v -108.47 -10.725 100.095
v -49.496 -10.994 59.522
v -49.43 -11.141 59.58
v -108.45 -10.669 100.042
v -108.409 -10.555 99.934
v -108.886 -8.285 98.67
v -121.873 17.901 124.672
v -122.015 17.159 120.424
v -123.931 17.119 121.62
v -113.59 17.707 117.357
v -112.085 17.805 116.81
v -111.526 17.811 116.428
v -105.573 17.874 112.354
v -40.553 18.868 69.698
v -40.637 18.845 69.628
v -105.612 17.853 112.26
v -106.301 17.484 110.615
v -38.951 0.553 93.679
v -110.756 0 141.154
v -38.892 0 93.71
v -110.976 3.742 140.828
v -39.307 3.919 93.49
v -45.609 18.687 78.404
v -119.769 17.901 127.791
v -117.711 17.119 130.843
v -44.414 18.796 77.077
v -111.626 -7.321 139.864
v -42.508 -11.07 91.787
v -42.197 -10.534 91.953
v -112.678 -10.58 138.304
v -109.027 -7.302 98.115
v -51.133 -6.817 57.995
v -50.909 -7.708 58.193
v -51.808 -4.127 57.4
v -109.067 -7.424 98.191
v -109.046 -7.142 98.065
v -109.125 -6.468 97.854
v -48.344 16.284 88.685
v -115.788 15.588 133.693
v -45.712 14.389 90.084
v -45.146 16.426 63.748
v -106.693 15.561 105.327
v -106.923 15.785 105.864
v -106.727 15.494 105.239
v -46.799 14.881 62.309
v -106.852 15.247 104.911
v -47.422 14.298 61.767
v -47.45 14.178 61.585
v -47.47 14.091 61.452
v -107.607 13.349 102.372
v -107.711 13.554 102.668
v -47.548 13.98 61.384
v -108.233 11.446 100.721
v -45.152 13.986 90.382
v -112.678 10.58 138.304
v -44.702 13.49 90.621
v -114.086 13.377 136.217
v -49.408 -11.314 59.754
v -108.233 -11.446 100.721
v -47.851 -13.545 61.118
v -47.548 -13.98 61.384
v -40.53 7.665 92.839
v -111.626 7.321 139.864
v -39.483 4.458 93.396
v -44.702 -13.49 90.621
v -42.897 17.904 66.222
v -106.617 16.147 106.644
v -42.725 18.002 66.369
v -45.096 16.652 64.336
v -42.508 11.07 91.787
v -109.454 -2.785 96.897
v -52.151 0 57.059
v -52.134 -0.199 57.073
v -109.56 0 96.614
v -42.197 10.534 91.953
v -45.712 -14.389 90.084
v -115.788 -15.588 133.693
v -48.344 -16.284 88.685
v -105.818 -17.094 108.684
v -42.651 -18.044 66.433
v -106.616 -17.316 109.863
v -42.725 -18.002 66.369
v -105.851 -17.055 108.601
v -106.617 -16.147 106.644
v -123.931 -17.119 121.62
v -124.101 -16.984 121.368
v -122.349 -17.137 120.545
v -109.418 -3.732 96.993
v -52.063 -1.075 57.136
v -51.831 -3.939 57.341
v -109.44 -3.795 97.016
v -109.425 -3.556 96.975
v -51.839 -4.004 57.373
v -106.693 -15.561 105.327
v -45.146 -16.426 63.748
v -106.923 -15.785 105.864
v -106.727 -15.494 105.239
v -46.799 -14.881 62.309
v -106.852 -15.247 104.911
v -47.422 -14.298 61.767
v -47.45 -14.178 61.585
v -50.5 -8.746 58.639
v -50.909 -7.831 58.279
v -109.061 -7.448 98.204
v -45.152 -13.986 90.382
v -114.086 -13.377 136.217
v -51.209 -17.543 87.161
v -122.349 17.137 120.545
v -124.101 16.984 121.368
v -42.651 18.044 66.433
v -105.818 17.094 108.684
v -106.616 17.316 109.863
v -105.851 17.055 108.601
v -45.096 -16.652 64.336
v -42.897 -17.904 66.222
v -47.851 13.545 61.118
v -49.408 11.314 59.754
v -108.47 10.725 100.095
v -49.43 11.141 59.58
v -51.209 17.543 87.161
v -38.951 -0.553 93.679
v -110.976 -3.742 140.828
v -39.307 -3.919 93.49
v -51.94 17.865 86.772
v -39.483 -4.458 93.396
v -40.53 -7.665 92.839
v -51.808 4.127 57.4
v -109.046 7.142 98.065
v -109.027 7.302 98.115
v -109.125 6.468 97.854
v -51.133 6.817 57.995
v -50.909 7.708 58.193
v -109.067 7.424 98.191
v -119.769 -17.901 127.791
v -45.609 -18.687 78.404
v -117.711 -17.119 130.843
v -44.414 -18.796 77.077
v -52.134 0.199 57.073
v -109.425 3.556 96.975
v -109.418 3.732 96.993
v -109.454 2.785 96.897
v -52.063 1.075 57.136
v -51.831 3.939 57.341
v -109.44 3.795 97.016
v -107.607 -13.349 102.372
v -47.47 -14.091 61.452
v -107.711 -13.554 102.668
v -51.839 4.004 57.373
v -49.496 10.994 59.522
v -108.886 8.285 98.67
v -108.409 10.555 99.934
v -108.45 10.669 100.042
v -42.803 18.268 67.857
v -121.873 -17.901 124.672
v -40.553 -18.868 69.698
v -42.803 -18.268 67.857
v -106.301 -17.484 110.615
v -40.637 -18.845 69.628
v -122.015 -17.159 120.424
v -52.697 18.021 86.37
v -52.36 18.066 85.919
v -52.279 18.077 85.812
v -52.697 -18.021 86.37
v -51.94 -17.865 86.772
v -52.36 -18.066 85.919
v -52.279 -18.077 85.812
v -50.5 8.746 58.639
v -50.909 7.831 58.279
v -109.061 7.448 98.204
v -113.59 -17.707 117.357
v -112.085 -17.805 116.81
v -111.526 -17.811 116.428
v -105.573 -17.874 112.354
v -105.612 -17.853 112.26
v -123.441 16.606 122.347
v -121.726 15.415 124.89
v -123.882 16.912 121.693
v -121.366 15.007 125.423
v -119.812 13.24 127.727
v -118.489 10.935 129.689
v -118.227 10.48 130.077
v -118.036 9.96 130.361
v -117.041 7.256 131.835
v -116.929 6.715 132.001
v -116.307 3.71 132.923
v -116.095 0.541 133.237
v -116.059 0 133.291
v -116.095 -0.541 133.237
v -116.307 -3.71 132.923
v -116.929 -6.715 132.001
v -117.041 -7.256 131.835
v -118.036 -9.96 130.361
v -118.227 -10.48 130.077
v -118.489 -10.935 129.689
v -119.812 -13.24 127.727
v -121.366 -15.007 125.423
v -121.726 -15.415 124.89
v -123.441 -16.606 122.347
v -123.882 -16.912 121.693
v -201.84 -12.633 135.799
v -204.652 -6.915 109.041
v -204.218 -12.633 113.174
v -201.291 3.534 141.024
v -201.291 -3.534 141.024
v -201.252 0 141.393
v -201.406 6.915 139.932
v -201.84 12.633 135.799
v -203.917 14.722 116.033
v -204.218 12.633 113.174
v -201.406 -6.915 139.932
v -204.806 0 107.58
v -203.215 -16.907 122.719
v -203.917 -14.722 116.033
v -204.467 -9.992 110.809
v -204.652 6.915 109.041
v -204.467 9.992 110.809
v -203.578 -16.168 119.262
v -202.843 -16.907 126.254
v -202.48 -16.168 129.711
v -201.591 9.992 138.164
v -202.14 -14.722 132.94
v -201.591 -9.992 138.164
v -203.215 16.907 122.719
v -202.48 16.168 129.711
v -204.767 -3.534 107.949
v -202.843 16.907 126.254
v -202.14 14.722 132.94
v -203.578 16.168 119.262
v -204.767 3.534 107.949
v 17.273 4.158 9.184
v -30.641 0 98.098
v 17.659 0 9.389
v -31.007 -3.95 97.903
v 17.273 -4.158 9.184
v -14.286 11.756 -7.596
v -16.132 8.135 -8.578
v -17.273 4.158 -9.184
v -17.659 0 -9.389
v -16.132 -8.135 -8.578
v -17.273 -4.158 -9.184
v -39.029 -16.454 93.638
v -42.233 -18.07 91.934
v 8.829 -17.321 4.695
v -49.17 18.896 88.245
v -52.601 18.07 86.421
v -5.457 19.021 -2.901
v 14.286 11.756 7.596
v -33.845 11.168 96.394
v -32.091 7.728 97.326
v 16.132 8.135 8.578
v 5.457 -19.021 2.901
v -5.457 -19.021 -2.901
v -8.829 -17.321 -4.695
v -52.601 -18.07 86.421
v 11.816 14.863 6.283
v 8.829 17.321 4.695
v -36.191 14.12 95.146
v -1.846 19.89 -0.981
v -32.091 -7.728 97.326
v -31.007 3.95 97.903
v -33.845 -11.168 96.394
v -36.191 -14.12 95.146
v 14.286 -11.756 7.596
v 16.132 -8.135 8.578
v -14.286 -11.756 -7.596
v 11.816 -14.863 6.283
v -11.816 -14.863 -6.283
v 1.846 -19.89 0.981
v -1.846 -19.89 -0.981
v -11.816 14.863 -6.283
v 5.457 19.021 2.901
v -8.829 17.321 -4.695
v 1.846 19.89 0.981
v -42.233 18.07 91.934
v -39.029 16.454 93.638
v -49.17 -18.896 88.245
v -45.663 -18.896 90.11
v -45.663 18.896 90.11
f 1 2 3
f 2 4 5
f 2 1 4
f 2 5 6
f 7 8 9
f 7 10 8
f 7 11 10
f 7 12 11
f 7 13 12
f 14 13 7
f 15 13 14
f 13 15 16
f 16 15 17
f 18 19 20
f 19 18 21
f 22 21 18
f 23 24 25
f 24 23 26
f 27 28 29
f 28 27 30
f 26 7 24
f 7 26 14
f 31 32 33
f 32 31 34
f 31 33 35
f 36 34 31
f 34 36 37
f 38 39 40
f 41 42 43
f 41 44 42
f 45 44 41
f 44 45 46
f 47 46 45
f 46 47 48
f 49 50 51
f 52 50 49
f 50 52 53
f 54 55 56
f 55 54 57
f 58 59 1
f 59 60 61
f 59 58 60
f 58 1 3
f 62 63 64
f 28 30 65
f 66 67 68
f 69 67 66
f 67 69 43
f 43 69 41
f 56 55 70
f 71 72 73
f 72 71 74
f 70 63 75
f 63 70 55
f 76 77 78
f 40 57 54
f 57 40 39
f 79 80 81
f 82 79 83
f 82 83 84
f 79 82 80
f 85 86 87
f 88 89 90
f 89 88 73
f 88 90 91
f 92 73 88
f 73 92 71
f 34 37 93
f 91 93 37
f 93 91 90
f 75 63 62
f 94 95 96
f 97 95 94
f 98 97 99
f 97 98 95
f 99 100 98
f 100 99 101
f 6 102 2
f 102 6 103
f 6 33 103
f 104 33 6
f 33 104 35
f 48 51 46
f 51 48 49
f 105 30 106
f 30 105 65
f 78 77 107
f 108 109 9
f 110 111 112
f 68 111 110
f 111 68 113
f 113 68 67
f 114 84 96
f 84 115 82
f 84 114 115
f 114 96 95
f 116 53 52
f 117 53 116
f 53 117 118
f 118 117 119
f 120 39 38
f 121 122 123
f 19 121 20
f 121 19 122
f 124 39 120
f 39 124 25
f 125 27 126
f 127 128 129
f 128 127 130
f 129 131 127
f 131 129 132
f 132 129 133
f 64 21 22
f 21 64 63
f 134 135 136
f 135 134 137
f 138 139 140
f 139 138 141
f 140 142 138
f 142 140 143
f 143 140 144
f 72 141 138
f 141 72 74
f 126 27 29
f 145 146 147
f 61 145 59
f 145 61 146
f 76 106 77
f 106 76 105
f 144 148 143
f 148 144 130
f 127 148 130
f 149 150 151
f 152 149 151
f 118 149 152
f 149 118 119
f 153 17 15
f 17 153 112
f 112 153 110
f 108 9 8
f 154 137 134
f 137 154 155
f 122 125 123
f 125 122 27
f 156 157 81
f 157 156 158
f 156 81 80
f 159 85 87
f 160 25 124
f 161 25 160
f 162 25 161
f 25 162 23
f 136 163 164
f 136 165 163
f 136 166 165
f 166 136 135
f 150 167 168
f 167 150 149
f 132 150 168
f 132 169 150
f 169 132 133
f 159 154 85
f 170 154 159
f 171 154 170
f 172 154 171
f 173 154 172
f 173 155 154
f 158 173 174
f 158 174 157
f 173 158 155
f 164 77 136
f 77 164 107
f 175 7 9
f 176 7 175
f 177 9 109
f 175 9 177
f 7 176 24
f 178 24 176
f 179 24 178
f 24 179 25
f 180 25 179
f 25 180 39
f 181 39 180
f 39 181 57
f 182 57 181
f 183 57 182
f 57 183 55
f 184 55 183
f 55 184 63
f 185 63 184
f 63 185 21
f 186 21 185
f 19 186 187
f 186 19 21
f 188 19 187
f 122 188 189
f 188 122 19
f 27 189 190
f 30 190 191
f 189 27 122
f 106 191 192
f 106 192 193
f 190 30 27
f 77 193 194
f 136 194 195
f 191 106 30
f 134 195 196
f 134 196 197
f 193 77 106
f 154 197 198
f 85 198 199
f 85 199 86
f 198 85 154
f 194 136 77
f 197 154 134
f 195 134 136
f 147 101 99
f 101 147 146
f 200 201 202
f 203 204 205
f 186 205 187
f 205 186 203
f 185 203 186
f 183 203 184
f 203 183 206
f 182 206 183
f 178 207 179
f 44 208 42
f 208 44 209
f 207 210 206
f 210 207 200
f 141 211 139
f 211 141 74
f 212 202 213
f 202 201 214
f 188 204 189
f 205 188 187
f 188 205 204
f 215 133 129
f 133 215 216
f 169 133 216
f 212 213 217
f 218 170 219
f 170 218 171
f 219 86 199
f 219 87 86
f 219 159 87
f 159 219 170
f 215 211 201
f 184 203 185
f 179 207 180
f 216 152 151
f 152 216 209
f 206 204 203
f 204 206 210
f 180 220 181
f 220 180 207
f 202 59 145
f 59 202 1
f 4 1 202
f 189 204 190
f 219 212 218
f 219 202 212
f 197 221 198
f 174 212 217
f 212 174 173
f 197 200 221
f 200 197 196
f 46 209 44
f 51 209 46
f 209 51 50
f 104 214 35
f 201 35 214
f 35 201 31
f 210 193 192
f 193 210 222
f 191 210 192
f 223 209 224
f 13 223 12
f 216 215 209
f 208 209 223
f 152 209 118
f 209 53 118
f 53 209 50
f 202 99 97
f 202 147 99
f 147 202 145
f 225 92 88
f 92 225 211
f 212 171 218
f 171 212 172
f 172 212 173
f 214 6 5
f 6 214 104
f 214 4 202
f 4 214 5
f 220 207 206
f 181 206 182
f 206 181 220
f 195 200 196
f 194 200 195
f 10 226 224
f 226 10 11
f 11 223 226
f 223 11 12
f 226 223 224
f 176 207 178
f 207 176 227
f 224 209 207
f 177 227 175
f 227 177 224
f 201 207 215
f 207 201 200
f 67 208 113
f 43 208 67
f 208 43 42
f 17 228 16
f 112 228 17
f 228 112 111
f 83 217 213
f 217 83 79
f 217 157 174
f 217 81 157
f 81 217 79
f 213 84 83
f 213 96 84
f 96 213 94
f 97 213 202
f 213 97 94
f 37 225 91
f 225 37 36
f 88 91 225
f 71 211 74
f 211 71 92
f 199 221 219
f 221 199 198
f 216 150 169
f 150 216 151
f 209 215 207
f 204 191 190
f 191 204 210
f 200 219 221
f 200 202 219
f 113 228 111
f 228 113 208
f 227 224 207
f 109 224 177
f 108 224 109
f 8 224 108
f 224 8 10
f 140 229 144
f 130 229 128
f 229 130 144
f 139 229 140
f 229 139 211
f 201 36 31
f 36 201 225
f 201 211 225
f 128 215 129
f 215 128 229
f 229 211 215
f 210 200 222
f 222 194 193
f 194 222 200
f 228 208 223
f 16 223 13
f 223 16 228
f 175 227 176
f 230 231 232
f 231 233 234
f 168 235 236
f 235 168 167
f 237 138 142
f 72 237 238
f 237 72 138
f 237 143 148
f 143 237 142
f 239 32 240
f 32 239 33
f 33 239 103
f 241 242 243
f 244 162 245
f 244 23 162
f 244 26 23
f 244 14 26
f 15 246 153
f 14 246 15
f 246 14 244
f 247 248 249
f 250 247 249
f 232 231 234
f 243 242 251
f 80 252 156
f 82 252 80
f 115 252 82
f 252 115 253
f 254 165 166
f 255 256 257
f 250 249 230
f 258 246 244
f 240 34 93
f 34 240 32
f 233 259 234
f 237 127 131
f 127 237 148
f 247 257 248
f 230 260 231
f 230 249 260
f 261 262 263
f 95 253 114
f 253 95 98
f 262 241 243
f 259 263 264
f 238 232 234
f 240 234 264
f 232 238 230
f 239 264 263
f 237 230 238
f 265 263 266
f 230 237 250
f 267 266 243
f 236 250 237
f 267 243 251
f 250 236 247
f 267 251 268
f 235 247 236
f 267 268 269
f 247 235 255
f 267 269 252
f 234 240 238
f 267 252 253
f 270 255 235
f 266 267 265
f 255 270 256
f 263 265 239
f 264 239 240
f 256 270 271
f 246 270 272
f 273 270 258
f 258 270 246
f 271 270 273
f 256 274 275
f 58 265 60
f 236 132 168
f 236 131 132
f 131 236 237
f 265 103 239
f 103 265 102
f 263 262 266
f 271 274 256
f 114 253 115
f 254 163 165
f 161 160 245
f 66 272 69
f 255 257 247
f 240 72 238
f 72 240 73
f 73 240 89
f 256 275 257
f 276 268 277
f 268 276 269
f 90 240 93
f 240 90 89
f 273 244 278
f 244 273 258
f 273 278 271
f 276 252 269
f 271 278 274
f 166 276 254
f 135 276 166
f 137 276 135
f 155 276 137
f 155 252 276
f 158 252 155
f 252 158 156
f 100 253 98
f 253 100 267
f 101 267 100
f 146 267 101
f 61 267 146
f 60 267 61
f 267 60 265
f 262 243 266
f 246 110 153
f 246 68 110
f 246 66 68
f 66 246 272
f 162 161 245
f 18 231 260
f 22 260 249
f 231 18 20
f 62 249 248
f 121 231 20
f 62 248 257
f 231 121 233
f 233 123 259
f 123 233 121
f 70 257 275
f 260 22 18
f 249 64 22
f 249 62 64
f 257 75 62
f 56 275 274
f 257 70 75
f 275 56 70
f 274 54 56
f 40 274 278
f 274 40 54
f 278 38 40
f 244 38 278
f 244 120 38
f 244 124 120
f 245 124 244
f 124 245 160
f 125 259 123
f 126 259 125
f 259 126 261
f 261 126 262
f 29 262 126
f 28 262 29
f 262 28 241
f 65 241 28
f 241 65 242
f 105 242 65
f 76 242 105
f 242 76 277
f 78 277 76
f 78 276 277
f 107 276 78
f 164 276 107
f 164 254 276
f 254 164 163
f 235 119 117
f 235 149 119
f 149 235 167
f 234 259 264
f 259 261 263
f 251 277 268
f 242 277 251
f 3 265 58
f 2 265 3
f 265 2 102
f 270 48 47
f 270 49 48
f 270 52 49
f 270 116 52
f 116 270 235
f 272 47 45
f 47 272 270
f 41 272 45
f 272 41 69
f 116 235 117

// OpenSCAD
SEED = rands(0, 100, 1)[0];
START_SIZE = 20;
START_HEIGHT = 90;

module childBranch(maxDepth = 3, seed, depth = 0, child = 1) {
  angle = 4 * (seed == -1 ?
    floor(rands(-12, 12, 1)[0]) : 
    floor(rands(-12, 12, 1, seed + child + 1)[0])
  );
  
  height = SEED == -1 ?
    floor(rands(4, 12, 1)[0]) * 2 :
    floor(rands(8, 24, 1, seed + child + 2)[0]);

  slide = SEED == -1 ?
    floor(rands(18, 24, 1)[0]) :
    floor(rands(18, 24, 1, seed + 3)[0]);

  rotate([0, angle, 0]) {
    cylinder(START_HEIGHT + height, START_SIZE - depth, START_SIZE - depth - 1);
   
    if (depth < maxDepth) {
      translate([0, 0, START_HEIGHT - height])
        branch(maxDepth, seed, depth + 1, child);
    }
  }
}

//BRANCH_COUNTS = [2, 2, 2, 2, 2, 2, 2, 2, 3, 3, 1, 1, 1, 2, 2, 2, 2, 2, 2, 2, 2, 2, 2];
BRANCH_COUNTS = [0,0,0,1,1,2];

module branch(maxDepth = 3, seed, depth = 0, child = 1) {
  children = floor(rands(0, len(BRANCH_COUNTS), 1, seed + 10)[0]);
  
  for (i = [0 : 1 : BRANCH_COUNTS[children]]) {
    childBranch(maxDepth, seed, depth, i);
  }
}


branch(2, SEED);
